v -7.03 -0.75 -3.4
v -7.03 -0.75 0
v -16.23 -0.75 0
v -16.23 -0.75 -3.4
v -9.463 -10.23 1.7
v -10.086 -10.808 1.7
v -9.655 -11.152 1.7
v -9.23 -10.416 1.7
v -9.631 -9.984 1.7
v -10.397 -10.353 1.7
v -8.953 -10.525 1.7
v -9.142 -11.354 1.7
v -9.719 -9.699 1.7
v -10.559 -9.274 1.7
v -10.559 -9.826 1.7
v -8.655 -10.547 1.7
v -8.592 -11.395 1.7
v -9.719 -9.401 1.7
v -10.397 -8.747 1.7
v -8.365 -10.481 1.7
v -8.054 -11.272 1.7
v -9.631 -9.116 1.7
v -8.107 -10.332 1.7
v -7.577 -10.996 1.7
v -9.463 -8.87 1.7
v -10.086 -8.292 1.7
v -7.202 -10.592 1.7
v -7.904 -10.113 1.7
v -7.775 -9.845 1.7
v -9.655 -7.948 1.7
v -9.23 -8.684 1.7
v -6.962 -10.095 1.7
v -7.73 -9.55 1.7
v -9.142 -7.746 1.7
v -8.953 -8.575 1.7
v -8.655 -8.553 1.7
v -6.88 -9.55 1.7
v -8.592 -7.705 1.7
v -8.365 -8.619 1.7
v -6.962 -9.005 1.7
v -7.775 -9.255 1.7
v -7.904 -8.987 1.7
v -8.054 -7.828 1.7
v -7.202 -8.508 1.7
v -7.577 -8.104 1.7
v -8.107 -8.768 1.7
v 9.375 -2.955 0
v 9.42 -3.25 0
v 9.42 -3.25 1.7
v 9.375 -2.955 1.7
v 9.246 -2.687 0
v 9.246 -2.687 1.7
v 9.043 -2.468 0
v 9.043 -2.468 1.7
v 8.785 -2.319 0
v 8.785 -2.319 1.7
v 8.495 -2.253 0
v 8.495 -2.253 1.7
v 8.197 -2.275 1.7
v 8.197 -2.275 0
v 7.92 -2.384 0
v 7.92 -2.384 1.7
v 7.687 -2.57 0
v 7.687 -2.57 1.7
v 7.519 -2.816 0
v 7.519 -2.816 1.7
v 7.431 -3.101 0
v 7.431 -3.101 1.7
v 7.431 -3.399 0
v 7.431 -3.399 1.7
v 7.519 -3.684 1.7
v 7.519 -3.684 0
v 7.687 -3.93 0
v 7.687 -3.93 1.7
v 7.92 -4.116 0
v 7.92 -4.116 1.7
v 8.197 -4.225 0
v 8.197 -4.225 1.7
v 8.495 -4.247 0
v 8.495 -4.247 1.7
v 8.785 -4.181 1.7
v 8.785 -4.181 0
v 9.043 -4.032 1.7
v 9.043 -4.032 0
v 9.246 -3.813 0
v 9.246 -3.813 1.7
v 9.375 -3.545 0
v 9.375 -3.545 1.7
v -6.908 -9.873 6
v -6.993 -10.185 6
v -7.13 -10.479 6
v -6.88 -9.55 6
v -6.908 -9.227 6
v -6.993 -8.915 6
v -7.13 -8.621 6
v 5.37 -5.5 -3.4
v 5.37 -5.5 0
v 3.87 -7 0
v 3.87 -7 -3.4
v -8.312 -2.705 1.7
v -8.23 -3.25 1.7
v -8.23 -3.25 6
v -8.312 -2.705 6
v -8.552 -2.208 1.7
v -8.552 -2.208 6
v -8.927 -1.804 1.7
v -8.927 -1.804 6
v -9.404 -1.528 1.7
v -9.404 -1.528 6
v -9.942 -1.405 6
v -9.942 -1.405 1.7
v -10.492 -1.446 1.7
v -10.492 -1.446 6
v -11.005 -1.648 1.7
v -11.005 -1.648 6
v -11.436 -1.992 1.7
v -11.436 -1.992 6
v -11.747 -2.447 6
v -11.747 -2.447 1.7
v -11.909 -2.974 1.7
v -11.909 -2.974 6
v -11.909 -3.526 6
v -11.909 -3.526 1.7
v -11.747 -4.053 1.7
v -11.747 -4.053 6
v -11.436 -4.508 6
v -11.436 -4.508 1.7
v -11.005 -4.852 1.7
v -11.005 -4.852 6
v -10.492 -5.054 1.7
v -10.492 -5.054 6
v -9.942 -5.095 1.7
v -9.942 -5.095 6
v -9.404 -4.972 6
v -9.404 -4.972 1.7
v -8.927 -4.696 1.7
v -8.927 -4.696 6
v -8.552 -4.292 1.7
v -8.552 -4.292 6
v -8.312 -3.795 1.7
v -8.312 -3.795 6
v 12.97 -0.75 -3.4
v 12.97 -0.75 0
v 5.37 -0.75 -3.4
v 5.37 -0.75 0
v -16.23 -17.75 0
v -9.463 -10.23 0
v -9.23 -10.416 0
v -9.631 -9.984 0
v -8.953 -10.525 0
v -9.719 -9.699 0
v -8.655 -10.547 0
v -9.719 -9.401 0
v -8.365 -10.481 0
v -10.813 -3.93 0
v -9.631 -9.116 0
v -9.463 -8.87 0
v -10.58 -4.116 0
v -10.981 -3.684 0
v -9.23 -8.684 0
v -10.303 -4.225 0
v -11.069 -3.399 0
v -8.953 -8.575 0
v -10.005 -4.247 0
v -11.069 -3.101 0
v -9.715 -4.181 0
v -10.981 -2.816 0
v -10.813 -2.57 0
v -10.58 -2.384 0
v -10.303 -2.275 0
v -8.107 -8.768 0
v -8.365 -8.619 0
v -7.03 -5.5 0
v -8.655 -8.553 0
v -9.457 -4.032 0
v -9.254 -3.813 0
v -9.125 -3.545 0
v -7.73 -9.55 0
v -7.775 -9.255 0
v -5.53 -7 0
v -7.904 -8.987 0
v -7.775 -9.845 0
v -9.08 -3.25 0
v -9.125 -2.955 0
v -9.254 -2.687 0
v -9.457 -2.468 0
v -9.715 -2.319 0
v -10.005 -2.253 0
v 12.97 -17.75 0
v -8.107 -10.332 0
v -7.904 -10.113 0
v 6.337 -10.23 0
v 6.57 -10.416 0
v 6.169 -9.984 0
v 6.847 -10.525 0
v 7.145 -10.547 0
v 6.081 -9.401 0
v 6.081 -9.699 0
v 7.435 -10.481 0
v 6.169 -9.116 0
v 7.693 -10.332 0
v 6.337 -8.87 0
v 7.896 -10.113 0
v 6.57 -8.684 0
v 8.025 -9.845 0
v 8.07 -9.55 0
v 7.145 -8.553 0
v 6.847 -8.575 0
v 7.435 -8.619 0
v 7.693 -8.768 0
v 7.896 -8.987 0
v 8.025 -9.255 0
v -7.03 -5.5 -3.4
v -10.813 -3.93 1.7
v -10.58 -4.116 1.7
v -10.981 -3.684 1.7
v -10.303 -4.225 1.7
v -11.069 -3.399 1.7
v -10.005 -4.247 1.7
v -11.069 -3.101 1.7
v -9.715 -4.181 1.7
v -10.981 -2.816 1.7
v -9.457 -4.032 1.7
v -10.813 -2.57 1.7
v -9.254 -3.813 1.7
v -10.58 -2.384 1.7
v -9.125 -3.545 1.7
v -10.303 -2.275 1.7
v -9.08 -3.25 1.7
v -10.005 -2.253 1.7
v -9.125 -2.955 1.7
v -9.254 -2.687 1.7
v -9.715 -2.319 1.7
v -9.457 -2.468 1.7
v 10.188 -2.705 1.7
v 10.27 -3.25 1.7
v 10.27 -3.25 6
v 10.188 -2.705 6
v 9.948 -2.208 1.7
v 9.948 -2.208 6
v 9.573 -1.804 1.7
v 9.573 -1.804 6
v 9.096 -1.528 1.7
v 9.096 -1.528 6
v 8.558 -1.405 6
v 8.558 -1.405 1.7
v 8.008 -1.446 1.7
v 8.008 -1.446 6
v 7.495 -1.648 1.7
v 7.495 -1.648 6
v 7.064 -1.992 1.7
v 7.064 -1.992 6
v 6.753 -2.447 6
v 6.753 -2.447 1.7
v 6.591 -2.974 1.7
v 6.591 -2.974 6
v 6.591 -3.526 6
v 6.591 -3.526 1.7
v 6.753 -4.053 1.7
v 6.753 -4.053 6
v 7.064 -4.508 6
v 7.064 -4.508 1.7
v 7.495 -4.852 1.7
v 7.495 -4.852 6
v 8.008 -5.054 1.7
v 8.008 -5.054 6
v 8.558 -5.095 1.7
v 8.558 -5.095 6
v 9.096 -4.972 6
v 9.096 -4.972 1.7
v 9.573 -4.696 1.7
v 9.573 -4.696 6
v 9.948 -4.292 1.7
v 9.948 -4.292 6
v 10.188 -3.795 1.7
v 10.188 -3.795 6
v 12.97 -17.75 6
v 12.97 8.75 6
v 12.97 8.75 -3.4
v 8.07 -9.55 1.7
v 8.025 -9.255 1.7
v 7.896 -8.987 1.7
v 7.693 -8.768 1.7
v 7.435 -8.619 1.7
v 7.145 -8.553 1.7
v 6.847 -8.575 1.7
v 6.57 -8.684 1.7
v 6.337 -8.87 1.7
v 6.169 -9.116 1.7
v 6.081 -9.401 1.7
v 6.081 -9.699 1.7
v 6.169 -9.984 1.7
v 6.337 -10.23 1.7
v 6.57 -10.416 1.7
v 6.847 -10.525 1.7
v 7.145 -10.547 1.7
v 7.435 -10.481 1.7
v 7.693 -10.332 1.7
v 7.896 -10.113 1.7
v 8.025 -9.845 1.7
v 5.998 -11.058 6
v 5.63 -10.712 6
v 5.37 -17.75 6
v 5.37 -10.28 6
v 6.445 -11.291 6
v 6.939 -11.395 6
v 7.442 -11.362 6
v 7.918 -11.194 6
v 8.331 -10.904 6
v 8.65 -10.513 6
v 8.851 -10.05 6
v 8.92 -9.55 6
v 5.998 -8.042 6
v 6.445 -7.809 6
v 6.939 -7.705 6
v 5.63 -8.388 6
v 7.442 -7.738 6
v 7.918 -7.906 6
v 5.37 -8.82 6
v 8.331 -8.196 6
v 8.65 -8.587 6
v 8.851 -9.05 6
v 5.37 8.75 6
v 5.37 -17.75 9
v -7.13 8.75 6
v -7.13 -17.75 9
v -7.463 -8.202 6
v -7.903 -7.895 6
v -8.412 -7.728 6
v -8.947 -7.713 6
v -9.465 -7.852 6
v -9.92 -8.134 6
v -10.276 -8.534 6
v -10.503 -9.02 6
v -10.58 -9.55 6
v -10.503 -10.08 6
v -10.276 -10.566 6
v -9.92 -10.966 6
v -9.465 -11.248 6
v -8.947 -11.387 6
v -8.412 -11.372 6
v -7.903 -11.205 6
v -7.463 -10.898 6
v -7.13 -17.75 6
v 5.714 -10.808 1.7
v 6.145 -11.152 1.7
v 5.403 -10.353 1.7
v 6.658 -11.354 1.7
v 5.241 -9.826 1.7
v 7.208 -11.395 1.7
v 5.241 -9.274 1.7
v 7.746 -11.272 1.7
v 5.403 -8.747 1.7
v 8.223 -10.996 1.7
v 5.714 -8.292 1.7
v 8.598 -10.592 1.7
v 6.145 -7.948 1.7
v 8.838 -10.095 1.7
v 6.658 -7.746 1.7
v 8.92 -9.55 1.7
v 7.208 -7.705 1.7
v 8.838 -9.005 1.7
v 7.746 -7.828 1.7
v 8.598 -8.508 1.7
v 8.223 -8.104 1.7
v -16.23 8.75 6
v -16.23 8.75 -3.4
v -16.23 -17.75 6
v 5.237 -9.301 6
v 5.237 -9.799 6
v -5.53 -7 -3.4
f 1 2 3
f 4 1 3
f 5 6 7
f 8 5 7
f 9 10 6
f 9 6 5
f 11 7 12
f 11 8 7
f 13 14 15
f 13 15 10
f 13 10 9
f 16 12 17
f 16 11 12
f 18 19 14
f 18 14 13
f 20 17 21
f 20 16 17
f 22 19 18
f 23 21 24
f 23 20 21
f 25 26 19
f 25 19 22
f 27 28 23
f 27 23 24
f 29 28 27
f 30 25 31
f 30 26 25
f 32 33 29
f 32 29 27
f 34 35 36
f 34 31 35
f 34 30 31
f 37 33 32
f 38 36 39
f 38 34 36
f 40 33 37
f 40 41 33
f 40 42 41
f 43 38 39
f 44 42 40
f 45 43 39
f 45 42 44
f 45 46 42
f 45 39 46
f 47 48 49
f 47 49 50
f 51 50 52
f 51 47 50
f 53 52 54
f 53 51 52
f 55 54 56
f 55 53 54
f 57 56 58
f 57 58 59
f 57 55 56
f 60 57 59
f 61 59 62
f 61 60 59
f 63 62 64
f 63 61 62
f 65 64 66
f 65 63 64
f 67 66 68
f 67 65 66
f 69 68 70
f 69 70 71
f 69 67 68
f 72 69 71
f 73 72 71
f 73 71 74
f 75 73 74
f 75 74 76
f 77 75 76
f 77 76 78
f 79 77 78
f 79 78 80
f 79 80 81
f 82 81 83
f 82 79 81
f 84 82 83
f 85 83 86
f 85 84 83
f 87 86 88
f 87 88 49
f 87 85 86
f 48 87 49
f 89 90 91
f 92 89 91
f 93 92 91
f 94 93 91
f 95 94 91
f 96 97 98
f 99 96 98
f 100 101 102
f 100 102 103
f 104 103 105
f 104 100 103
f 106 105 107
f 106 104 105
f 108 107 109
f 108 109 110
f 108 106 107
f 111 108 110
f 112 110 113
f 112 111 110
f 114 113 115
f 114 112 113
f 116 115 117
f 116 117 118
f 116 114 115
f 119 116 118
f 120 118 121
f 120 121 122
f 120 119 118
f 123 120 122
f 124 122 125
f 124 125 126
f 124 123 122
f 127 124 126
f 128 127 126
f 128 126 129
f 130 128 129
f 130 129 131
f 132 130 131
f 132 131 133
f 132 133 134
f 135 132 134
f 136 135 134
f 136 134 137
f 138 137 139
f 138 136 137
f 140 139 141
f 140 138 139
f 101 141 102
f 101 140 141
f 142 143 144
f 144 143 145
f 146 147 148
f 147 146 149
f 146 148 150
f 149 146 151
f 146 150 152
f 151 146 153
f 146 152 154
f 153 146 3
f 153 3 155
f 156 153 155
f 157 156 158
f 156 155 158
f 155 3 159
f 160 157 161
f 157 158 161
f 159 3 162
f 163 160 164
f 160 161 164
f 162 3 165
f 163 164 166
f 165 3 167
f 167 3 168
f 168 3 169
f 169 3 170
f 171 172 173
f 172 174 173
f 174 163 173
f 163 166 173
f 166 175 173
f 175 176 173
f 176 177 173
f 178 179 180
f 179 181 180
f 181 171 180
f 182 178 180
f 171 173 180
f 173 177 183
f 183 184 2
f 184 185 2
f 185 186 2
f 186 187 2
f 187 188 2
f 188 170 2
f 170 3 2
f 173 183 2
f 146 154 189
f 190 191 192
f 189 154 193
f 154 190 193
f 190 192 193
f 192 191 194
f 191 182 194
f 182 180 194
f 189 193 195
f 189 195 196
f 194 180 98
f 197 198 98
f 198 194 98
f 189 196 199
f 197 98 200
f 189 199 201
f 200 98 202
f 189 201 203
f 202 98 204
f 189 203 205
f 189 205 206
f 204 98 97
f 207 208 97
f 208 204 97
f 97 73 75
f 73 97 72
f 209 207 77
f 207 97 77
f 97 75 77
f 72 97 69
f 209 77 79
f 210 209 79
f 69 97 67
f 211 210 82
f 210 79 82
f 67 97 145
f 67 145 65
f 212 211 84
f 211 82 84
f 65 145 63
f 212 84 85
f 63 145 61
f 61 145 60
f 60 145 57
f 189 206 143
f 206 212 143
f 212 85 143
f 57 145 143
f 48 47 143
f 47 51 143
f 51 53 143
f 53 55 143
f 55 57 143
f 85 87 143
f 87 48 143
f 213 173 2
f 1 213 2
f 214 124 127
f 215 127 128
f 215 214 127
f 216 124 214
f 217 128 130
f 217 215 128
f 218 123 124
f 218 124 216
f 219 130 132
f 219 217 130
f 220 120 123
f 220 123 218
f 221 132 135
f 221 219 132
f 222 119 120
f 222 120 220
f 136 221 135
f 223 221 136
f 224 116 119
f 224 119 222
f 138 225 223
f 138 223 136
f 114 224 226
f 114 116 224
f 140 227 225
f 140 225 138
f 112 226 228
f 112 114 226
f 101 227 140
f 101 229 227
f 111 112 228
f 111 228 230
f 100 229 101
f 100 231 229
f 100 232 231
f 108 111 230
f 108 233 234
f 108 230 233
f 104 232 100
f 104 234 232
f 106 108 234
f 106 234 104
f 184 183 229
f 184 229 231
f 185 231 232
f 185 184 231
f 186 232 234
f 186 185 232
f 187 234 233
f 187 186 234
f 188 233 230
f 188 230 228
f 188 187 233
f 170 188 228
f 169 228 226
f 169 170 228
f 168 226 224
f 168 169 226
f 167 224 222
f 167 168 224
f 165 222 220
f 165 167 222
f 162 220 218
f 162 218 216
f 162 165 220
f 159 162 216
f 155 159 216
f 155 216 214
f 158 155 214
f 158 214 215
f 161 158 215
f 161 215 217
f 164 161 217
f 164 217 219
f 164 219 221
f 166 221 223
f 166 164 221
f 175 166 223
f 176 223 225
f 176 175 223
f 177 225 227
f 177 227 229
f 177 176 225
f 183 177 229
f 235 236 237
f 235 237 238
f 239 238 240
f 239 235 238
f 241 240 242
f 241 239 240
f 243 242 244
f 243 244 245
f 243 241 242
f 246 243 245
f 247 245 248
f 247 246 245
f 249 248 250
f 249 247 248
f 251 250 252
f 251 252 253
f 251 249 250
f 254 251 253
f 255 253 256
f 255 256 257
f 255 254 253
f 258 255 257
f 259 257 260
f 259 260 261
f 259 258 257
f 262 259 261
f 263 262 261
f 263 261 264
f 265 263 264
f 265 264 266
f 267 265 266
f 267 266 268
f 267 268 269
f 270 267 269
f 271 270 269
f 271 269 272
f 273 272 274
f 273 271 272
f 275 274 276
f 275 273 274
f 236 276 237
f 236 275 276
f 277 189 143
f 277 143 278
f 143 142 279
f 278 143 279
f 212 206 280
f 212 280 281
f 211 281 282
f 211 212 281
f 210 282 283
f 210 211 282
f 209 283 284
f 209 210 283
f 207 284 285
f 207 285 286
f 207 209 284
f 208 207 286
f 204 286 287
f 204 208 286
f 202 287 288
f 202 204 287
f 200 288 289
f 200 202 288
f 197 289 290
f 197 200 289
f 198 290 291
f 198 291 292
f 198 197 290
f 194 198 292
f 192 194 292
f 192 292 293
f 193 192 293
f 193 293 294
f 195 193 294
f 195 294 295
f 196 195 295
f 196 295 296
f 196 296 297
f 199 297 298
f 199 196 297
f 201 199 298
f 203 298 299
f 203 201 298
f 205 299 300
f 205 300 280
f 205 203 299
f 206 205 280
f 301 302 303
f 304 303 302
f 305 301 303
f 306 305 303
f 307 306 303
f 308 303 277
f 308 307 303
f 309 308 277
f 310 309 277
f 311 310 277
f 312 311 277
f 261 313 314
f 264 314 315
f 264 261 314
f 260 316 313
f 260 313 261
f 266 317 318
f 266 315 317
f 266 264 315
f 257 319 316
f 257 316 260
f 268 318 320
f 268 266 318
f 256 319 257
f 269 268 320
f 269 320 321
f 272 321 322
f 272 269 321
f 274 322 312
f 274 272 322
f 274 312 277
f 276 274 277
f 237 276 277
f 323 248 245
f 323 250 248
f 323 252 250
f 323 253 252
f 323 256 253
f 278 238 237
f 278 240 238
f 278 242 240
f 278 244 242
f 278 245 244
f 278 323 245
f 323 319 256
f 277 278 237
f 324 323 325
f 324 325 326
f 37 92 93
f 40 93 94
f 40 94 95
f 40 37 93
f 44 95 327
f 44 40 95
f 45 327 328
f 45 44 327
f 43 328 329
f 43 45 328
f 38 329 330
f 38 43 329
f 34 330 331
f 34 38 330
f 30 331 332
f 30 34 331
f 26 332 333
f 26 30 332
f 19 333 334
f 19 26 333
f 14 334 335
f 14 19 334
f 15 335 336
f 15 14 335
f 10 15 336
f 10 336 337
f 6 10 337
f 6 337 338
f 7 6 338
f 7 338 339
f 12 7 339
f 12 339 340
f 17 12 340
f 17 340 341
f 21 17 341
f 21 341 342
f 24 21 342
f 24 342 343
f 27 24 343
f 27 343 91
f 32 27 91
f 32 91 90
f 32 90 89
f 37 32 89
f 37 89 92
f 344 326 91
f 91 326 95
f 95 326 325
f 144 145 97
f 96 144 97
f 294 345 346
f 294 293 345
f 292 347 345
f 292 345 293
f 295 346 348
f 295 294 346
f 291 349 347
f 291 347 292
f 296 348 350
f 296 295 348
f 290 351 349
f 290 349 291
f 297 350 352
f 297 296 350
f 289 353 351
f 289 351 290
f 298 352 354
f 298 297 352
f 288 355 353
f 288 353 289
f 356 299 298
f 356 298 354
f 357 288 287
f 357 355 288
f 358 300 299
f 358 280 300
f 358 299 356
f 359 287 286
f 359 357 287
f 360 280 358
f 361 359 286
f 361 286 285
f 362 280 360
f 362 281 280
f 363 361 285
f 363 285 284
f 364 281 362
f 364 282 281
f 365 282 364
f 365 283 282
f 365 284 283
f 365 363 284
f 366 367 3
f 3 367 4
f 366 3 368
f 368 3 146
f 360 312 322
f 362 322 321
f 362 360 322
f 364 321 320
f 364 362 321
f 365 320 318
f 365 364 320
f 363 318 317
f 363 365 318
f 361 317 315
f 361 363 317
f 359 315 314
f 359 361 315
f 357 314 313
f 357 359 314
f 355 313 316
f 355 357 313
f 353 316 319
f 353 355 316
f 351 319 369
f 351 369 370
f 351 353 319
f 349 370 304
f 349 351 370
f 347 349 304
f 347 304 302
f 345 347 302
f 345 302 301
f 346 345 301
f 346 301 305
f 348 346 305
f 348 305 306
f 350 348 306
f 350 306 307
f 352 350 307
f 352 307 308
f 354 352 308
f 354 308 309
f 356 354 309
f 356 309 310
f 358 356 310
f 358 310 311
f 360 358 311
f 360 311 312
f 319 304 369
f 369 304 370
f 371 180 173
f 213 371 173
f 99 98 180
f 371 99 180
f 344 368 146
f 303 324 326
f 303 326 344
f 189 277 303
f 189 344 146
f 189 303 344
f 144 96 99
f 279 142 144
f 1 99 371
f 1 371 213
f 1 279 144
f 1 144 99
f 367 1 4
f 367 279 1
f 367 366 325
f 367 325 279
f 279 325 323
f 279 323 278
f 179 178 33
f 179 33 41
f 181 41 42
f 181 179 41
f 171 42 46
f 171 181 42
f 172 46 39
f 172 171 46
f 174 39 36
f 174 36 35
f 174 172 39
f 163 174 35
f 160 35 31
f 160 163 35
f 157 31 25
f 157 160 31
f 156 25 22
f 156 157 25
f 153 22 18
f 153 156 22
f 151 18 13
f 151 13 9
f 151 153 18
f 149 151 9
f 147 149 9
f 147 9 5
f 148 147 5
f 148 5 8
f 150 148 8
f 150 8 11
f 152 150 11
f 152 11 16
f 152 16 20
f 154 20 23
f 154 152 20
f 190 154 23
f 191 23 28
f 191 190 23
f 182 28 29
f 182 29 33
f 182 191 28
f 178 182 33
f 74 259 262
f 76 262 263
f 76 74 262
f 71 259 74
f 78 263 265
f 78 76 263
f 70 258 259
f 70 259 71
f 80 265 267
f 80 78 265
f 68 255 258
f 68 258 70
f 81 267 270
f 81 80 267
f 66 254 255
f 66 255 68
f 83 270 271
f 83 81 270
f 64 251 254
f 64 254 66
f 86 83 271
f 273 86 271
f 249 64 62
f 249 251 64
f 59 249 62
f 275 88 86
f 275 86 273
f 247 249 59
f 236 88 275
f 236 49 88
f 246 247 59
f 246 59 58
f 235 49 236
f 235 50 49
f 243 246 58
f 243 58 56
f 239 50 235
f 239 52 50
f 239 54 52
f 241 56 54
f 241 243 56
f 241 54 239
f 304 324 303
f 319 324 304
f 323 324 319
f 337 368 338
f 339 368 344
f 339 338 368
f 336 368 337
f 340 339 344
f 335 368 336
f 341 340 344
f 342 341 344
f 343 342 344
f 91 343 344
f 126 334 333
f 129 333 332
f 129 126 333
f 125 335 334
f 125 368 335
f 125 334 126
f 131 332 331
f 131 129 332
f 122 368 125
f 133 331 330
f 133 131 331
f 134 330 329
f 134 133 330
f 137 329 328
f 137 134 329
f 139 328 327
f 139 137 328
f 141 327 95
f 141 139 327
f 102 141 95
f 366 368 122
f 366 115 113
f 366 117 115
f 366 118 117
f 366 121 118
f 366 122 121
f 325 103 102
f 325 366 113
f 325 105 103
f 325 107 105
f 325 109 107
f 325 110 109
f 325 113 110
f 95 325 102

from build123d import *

# Parameters (mm, degrees)
SKETCH1_R           = 1
BOSS_EXTRUDE2_DEPTH = 1.7
SKETCH2_R           = 1.85
BOSS_EXTRUDE3_DEPTH = 4.3
BOSS_EXTRUDE4_DEPTH = 3.4
BOSS_EXTRUDE5_DEPTH = 12.5


with BuildPart() as part:
    # Sketch1 → Boss-Extrude2 (new body)
    with BuildSketch(Plane.XY):
        Polygon((-16.230109425, 8.75), (-16.230109425, -1.75), (-16.230109425, -7), (-16.230109425, -17.75), (12.969890575, -17.75), (12.969890575, -7), (12.969890575, -1.75), (12.969890575, 8.75), align=None)
        with Locations((-10.080109425, -3.25)):
            Circle(SKETCH1_R, mode=Mode.SUBTRACT)
        with Locations((8.419890575, -3.25)):
            Circle(SKETCH1_R, mode=Mode.SUBTRACT)
        with Locations((-8.730109425, -9.55)):
            Circle(SKETCH1_R, mode=Mode.SUBTRACT)
        with Locations((7.069890575, -9.55)):
            Circle(SKETCH1_R, mode=Mode.SUBTRACT)
    extrude(amount=BOSS_EXTRUDE2_DEPTH)

    # Sketch2 → Boss-Extrude3 (add)
    with BuildSketch(Plane.XY.offset(1.7)):
        Polygon((-16.230109425, 8.75), (-16.230109425, -1.75), (-16.230109425, -7), (-16.230109425, -17.75), (12.969890575, -17.75), (12.969890575, -7), (12.969890575, -1.75), (12.969890575, 8.75), align=None)
        with Locations((-10.080109425, -3.25)):
            Circle(SKETCH2_R, mode=Mode.SUBTRACT)
        with Locations((8.419890575, -3.25)):
            Circle(SKETCH2_R, mode=Mode.SUBTRACT)
        with Locations((-8.730109425, -9.55)):
            Circle(SKETCH2_R, mode=Mode.SUBTRACT)
        with Locations((7.069890575, -9.55)):
            Circle(SKETCH2_R, mode=Mode.SUBTRACT)
    extrude(amount=BOSS_EXTRUDE3_DEPTH)

    # Sketch3 → Boss-Extrude4 (add)
    with BuildSketch(Plane(origin=(0, 0, 0), x_dir=(-1, 0, 0), z_dir=(0, 0, -1))):
        Polygon((-3.869890575, -7), (5.530109425, -7), (7.030109425, -5.5), (7.030109425, -0.75), (16.230109425, -0.75), (16.230109425, 8.75), (-12.969890575, 8.75), (-12.969890575, -0.75), (-5.369890575, -0.75), (-5.369890575, -5.5), align=None)
    extrude(amount=BOSS_EXTRUDE4_DEPTH)

    # Sketch4 → Boss-Extrude5 (add)
    with BuildSketch(Plane(origin=(5.369890575, 0, 0), x_dir=(0, 0, -1), z_dir=(1, 0, 0))):
        Polygon((-6, -17.75), (-6, 8.75), (-9, -17.75), align=None)
    extrude(amount=-BOSS_EXTRUDE5_DEPTH)


solid = part.part
